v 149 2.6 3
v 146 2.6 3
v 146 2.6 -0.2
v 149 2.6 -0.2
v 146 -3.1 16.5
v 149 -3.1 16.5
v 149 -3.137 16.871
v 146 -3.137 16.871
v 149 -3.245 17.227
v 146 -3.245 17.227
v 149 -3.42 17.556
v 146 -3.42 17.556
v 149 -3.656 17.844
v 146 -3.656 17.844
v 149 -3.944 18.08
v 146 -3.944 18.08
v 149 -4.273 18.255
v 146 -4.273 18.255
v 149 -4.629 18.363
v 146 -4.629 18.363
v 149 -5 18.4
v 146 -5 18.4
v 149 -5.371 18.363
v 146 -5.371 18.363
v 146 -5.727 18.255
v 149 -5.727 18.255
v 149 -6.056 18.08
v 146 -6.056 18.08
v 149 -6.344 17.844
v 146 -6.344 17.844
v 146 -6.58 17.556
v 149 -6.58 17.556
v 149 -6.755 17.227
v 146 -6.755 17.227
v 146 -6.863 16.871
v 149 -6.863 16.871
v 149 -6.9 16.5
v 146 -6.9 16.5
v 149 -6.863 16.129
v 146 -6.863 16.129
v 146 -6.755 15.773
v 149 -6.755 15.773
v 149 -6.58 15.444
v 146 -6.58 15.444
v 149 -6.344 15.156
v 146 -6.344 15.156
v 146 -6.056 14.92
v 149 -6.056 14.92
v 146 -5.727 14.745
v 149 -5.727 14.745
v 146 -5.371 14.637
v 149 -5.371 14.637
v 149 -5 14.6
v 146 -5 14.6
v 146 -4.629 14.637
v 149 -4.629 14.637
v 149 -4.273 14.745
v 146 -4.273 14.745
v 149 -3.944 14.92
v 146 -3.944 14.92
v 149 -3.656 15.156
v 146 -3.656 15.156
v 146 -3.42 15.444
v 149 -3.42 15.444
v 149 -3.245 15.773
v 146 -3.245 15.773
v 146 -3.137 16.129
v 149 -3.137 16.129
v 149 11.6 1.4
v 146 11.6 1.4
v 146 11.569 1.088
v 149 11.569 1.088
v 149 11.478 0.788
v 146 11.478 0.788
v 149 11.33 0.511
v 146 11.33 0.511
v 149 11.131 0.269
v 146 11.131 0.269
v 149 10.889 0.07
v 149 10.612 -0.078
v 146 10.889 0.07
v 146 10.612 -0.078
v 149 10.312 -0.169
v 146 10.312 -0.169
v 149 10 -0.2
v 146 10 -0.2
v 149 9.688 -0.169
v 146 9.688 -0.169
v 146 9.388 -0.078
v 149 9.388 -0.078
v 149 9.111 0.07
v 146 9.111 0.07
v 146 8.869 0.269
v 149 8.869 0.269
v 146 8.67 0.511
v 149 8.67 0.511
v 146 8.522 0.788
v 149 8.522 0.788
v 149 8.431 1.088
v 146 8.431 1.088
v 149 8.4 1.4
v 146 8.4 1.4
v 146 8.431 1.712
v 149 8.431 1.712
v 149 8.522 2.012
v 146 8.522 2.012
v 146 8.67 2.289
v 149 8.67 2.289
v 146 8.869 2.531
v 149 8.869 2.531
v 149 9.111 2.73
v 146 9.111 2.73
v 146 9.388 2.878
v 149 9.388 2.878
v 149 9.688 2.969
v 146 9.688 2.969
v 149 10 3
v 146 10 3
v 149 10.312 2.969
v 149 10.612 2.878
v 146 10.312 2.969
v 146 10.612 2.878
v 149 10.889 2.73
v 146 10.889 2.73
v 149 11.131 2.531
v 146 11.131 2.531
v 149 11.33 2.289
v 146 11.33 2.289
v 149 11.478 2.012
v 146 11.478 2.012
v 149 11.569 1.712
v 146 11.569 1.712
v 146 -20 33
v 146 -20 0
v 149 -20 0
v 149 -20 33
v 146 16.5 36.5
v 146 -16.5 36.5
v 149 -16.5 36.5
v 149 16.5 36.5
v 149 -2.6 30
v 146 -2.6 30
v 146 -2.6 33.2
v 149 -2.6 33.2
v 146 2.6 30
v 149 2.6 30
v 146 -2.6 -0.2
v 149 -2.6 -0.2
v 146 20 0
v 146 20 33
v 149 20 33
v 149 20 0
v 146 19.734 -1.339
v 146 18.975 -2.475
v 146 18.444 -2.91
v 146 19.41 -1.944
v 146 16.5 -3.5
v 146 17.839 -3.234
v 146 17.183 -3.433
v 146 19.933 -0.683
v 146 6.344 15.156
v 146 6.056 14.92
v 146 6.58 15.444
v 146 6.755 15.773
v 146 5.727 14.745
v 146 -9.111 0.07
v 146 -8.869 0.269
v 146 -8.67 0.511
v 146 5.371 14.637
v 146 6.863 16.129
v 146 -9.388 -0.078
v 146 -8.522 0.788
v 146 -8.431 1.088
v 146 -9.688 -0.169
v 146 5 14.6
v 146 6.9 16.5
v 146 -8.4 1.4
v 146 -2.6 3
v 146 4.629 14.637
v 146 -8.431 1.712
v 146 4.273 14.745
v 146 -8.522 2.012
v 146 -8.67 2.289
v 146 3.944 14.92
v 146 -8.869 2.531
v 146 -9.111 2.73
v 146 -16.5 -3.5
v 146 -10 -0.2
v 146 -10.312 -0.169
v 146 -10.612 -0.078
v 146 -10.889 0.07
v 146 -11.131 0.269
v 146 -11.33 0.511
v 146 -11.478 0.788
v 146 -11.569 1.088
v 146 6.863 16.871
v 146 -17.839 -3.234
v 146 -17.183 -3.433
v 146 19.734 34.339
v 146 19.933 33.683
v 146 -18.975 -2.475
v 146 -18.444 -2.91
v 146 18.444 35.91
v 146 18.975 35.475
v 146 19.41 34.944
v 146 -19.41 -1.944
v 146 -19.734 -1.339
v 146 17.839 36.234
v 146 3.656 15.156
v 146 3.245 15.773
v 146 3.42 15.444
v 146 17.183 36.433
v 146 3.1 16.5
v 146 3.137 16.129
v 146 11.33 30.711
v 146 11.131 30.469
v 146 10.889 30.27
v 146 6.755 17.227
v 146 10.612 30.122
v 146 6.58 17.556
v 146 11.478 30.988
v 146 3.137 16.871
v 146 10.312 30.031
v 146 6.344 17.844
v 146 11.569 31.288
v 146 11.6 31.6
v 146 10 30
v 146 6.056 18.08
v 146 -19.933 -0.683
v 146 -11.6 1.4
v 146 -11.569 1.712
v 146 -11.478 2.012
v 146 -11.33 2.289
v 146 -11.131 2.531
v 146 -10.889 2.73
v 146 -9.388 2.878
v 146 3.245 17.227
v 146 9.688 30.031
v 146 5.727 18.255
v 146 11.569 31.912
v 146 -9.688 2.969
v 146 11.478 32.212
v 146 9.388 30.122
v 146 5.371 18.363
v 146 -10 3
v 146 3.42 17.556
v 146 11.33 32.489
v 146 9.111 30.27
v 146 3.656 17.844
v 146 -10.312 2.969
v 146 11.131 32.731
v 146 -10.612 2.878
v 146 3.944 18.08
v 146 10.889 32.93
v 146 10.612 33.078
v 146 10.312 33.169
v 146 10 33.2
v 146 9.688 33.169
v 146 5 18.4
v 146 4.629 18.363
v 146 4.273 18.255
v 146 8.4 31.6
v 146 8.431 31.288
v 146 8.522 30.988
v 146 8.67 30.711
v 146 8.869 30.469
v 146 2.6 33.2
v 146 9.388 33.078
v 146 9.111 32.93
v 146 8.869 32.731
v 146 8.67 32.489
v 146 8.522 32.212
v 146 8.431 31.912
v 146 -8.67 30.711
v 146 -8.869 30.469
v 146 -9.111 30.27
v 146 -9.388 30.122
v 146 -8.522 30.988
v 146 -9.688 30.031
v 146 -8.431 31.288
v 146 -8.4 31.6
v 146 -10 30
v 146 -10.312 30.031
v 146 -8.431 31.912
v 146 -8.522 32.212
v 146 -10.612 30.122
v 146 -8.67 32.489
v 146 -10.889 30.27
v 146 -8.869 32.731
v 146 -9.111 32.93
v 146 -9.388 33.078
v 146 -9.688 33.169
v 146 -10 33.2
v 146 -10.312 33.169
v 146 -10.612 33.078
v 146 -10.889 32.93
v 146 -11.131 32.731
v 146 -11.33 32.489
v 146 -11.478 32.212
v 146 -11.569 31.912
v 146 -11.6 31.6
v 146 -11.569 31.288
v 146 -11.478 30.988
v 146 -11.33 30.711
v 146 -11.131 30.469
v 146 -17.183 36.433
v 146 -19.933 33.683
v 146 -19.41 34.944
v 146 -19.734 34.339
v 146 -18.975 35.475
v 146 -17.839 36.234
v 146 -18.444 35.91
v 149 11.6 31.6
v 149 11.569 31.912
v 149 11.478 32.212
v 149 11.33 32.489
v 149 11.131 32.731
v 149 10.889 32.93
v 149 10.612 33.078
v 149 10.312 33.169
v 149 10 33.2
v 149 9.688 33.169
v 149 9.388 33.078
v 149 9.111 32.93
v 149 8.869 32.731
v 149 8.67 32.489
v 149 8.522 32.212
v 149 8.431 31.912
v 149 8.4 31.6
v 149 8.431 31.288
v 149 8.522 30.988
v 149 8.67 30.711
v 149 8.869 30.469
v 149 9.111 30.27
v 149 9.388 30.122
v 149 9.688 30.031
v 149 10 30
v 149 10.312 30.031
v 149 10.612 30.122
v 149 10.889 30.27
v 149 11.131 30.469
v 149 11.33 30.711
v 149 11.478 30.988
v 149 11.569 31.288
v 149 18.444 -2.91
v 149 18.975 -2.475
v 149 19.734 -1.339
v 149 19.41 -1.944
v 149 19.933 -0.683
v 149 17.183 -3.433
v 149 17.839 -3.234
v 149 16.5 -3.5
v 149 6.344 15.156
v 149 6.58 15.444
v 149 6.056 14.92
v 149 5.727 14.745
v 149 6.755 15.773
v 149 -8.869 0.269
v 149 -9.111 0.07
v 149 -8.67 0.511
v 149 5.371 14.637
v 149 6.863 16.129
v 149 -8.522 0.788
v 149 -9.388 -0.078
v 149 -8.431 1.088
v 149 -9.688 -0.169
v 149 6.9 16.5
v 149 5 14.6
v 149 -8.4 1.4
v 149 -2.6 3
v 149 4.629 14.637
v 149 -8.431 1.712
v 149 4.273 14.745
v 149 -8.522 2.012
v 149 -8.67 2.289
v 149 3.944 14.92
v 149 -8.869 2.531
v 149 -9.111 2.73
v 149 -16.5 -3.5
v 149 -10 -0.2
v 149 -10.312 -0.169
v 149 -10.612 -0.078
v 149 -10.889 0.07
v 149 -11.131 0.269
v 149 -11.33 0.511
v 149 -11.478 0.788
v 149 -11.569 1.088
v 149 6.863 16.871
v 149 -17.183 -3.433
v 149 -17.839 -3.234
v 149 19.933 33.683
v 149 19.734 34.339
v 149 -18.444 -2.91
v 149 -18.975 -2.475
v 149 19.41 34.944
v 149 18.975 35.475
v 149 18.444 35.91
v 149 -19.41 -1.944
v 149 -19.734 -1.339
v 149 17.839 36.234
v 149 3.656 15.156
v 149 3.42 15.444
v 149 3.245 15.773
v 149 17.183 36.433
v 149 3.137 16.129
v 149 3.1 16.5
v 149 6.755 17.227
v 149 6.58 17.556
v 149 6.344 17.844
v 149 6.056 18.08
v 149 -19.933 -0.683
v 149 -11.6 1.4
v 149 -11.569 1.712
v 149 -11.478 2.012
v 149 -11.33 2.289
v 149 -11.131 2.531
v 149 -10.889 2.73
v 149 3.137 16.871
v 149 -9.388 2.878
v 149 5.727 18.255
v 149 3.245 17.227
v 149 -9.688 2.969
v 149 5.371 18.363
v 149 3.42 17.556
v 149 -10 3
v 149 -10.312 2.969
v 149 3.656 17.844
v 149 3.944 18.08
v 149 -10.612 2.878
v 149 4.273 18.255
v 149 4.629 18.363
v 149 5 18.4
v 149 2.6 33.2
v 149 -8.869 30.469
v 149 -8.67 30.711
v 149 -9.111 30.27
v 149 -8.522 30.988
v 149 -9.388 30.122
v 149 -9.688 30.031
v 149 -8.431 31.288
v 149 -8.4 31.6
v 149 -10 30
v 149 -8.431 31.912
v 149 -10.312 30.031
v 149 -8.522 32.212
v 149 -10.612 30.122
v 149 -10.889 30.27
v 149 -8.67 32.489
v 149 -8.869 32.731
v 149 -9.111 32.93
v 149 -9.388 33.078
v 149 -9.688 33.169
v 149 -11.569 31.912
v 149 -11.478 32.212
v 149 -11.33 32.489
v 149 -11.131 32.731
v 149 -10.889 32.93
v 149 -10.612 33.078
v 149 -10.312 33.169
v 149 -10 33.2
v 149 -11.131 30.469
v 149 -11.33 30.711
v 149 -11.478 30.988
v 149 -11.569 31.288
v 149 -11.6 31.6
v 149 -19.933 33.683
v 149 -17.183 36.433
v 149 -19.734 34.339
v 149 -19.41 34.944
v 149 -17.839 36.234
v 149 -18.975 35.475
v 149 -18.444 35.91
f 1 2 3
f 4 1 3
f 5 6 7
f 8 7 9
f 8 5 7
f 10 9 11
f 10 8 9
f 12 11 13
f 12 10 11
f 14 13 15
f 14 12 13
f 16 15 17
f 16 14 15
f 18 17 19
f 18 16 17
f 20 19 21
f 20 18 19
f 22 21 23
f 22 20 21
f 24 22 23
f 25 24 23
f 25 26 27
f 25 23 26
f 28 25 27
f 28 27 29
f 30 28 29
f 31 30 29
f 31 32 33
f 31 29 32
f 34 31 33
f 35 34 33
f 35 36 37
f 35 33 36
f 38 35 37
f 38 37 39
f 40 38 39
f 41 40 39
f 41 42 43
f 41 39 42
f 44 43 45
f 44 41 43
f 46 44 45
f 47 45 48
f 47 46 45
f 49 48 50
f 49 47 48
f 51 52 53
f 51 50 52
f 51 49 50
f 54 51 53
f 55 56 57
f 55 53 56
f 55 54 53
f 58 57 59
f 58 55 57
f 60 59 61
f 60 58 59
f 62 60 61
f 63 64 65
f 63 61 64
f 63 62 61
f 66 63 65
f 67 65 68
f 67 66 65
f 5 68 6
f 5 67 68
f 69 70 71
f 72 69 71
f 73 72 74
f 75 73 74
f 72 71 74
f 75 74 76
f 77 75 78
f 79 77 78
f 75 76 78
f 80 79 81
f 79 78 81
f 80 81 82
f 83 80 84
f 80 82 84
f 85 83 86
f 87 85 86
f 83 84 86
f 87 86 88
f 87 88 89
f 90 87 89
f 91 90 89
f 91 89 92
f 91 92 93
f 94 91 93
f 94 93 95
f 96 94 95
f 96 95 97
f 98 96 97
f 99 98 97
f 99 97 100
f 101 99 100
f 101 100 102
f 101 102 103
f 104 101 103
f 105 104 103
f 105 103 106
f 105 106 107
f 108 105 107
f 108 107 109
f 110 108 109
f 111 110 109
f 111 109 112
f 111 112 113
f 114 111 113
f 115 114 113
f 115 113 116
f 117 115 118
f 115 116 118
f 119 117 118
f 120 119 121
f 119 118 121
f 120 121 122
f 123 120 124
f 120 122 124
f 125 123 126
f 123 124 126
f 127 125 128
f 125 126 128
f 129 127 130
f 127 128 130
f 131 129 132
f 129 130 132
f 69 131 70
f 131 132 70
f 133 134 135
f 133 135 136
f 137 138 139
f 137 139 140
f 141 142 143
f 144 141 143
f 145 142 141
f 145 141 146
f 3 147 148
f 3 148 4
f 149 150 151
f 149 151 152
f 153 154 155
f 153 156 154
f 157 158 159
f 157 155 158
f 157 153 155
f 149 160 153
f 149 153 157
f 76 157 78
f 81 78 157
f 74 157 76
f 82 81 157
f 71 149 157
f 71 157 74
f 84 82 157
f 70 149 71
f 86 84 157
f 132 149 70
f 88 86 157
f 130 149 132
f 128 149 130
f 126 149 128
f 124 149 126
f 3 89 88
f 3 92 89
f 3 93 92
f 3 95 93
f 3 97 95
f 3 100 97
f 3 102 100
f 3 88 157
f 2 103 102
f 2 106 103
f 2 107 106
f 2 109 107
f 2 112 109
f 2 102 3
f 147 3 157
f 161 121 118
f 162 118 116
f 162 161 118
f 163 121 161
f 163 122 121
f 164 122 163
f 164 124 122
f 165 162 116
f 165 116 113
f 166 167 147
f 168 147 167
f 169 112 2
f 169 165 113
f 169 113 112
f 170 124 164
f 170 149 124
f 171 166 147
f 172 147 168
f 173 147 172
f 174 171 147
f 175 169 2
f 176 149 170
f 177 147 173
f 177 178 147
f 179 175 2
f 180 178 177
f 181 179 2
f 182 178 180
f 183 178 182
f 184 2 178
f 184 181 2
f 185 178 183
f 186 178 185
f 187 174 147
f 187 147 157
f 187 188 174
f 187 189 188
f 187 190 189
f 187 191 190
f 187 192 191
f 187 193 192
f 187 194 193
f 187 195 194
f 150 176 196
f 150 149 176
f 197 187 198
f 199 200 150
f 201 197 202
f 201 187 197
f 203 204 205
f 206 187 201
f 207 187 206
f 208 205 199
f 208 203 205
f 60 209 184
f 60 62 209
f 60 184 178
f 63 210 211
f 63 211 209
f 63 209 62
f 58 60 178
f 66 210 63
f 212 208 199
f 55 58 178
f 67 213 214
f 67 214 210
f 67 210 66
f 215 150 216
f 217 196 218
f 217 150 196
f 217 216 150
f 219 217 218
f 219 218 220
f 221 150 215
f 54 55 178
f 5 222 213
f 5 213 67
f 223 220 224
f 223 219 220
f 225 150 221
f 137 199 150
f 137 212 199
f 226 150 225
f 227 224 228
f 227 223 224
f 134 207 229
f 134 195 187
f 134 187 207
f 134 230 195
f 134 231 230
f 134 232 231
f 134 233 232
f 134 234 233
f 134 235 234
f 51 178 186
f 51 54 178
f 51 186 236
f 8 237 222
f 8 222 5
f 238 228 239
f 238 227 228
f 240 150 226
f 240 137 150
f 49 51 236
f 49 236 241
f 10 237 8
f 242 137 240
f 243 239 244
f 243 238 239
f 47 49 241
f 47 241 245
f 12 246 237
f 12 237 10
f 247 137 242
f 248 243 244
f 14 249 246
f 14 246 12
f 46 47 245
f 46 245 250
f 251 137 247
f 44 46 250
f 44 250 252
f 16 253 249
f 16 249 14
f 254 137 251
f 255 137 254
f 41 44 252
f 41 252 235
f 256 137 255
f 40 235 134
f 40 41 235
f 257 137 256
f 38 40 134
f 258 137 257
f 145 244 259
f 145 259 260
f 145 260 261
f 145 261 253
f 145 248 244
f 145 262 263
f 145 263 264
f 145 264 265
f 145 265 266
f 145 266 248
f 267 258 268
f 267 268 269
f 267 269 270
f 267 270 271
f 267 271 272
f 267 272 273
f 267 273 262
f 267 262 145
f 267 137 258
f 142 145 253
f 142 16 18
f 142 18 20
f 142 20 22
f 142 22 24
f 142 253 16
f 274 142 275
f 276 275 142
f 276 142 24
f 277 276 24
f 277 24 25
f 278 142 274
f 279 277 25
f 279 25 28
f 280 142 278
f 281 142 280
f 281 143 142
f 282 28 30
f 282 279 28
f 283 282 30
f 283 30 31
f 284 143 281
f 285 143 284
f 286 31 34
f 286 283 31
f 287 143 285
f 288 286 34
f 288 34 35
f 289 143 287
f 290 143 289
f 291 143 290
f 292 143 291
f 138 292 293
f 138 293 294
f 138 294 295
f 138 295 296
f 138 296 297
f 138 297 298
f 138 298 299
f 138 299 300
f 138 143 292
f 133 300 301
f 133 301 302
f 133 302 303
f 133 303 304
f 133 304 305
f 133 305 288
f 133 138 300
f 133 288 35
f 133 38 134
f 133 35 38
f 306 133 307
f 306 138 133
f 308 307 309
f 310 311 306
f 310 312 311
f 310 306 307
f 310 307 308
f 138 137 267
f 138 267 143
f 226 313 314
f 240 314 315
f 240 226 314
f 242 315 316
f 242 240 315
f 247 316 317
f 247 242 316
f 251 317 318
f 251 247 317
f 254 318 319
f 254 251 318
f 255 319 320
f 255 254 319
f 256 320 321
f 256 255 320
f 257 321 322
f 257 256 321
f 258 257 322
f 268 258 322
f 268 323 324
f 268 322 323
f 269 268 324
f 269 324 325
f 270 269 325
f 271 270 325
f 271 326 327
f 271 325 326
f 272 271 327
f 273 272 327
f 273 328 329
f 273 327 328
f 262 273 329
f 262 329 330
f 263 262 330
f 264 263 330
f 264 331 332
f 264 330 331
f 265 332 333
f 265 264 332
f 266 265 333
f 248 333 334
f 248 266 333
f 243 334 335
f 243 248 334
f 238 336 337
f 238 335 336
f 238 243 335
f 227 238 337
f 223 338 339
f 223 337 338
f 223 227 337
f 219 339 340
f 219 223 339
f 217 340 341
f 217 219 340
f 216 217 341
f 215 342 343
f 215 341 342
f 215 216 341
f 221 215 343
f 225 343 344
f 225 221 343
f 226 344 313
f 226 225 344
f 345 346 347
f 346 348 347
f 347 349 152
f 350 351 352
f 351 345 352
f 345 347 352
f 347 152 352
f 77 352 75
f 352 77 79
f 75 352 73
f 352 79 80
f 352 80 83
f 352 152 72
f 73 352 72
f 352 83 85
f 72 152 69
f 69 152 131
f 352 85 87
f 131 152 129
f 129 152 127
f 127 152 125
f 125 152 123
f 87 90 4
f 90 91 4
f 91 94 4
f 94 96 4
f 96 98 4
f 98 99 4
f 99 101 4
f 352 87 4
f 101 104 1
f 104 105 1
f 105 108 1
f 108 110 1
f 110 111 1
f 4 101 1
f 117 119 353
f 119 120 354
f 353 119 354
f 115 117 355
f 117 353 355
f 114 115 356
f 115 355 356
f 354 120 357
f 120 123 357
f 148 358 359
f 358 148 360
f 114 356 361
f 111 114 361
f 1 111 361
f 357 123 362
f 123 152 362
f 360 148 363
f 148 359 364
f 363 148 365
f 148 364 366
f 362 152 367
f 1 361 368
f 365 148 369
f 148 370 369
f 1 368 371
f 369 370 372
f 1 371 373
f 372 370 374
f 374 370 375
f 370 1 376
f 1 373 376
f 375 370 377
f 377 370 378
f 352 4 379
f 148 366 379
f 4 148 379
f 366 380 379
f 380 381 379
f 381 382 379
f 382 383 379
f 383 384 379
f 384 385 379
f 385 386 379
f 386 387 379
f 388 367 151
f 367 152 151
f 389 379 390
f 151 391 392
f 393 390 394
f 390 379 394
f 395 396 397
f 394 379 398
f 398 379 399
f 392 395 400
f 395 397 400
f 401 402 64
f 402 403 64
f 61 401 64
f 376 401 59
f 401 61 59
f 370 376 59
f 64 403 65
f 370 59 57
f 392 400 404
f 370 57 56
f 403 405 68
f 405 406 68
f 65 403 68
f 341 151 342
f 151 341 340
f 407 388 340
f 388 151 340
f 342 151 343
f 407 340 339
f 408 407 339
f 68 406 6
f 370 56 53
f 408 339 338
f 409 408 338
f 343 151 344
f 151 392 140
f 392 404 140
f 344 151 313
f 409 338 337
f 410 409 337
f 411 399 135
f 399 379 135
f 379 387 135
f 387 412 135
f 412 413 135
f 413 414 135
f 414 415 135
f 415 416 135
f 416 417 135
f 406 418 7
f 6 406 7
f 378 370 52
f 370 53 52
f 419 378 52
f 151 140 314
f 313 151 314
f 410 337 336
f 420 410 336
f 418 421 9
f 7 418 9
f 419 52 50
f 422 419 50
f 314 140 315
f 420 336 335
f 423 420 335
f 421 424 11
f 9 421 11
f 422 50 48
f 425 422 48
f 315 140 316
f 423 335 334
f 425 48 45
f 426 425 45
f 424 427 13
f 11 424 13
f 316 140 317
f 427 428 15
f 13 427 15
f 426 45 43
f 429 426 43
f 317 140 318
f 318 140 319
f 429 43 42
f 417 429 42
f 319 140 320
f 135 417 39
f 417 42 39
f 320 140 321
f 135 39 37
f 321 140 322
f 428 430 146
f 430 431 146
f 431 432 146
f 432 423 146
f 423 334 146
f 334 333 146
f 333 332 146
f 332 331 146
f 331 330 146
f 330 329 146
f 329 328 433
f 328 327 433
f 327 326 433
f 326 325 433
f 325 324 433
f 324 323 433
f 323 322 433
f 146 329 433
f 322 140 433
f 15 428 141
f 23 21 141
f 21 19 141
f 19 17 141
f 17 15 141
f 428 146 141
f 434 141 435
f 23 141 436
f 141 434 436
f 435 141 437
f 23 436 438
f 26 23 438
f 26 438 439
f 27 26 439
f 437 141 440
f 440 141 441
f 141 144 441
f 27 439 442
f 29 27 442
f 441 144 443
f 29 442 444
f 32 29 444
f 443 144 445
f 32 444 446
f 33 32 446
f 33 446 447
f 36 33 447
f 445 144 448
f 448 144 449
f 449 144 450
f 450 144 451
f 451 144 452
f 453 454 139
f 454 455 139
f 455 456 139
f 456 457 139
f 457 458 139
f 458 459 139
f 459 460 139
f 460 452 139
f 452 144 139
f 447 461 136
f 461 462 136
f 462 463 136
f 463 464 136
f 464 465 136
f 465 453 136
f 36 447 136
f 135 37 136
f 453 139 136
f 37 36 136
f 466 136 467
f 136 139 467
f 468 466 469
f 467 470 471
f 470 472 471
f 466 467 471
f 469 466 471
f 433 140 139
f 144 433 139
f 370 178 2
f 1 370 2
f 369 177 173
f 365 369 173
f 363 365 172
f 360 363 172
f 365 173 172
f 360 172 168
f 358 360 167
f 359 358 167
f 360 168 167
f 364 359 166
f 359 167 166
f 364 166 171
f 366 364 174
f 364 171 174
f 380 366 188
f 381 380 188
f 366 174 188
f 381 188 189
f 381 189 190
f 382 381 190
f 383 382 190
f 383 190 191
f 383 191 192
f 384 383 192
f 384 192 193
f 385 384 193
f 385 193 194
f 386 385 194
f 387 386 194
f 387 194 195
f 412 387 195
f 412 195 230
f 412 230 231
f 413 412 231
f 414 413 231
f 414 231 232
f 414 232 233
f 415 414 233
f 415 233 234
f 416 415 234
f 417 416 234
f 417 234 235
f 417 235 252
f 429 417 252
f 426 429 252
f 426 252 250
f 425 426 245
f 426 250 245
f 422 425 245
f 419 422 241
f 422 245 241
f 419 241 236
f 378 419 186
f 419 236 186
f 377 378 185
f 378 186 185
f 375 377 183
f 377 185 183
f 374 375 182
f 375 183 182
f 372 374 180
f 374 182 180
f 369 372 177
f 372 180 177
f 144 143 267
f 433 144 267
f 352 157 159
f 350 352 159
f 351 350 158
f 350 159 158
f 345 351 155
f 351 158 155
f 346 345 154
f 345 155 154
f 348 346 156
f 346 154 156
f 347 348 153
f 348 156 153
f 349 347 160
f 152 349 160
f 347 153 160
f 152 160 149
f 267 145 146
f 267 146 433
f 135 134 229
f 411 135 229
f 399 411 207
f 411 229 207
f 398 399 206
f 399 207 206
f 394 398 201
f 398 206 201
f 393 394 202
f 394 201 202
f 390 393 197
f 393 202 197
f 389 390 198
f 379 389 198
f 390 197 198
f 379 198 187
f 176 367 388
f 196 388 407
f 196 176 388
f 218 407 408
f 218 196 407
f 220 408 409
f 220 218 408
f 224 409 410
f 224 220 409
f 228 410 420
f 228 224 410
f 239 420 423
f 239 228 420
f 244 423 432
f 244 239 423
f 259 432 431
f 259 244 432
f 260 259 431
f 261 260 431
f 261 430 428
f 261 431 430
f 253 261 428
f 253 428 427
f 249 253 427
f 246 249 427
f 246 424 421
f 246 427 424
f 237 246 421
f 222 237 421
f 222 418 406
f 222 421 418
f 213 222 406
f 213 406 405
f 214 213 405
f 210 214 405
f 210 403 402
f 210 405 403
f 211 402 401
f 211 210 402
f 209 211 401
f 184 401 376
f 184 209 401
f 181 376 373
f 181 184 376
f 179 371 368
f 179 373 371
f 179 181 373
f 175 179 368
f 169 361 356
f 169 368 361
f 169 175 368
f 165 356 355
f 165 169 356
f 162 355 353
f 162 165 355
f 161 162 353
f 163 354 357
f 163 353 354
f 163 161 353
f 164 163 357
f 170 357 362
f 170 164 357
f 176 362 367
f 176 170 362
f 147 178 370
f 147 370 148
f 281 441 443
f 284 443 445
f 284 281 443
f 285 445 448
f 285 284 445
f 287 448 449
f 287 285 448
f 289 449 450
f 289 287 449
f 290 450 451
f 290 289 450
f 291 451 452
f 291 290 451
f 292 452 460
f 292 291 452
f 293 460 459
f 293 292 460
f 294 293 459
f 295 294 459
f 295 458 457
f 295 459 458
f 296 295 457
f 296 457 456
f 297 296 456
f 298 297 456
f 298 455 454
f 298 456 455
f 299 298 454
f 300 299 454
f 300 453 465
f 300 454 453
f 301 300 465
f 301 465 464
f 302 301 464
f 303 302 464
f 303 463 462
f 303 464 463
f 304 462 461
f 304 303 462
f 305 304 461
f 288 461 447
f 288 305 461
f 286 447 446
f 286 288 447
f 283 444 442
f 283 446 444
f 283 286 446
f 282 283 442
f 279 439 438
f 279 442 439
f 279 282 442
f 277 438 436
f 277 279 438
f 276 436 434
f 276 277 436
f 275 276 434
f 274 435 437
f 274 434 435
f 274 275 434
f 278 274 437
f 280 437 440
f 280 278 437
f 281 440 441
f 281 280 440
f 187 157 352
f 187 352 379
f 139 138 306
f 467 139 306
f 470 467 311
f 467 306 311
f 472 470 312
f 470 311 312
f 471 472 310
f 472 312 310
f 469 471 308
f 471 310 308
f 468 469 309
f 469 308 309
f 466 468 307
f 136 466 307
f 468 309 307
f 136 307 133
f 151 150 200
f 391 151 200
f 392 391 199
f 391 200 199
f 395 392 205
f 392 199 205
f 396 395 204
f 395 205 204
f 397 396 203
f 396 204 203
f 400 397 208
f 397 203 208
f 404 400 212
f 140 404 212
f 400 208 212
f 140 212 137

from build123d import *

# Parameters (mm, degrees)
PAD008_DEPTH    = 3
SKETCH034_R     = 1.6
SKETCH034_W     = 5.2
SKETCH034_H     = 3.2
POCKET021_DEPTH = 116.297072
SKETCH035_R     = 1.9
POCKET022_DEPTH = 3.001


with BuildPart() as part:
    # Sketch033 → Pad008 (new body)
    with BuildSketch(Plane.YZ):
        with BuildLine():
            Line((-16.5, 20), (16.5, 20))
            ThreePointArc((20, 16.5), (18.974874, 18.974874), (16.5, 20))
            Line((20, 16.5), (20, -16.5))
            ThreePointArc((16.5, -20), (18.974874, -18.974874), (20, -16.5))
            Line((16.5, -20), (-16.5, -20))
            ThreePointArc((-20, -16.5), (-18.974874, -18.974874), (-16.5, -20))
            Line((-20, -16.5), (-20, 16.5))
            ThreePointArc((-16.5, 20), (-18.974874, 18.974874), (-20, 16.5))
        make_face()
    extrude(amount=PAD008_DEPTH)

    # Sketch034 → Pocket021 (cut, through all)
    with BuildSketch(Plane.YZ):
        with Locations((-10, 15.1)):
            Circle(SKETCH034_R)
        with Locations((10, 15.1)):
            Circle(SKETCH034_R)
        with Locations((0, 15.1)):
            Rectangle(SKETCH034_W, SKETCH034_H)
    pocket021 = extrude(amount=POCKET021_DEPTH, mode=Mode.SUBTRACT)

    # Mirrored019: Pocket021 across Sketch034 H_Axis
    add(pocket021.mirror(Plane.XY), mode=Mode.SUBTRACT)

    # Sketch035 → Pocket022 (cut, through all)
    with BuildSketch(Plane.YZ):
        with Locations((-5, 0)):
            Circle(SKETCH035_R)
        with Locations((5, 0)):
            Circle(SKETCH035_R)
    extrude(amount=POCKET022_DEPTH, mode=Mode.SUBTRACT)


with BuildPart() as part_1:
    # Body006 placement: moved
    add(part.part.moved(Location((146, 0, 16.5))))


solid = part_1.part
